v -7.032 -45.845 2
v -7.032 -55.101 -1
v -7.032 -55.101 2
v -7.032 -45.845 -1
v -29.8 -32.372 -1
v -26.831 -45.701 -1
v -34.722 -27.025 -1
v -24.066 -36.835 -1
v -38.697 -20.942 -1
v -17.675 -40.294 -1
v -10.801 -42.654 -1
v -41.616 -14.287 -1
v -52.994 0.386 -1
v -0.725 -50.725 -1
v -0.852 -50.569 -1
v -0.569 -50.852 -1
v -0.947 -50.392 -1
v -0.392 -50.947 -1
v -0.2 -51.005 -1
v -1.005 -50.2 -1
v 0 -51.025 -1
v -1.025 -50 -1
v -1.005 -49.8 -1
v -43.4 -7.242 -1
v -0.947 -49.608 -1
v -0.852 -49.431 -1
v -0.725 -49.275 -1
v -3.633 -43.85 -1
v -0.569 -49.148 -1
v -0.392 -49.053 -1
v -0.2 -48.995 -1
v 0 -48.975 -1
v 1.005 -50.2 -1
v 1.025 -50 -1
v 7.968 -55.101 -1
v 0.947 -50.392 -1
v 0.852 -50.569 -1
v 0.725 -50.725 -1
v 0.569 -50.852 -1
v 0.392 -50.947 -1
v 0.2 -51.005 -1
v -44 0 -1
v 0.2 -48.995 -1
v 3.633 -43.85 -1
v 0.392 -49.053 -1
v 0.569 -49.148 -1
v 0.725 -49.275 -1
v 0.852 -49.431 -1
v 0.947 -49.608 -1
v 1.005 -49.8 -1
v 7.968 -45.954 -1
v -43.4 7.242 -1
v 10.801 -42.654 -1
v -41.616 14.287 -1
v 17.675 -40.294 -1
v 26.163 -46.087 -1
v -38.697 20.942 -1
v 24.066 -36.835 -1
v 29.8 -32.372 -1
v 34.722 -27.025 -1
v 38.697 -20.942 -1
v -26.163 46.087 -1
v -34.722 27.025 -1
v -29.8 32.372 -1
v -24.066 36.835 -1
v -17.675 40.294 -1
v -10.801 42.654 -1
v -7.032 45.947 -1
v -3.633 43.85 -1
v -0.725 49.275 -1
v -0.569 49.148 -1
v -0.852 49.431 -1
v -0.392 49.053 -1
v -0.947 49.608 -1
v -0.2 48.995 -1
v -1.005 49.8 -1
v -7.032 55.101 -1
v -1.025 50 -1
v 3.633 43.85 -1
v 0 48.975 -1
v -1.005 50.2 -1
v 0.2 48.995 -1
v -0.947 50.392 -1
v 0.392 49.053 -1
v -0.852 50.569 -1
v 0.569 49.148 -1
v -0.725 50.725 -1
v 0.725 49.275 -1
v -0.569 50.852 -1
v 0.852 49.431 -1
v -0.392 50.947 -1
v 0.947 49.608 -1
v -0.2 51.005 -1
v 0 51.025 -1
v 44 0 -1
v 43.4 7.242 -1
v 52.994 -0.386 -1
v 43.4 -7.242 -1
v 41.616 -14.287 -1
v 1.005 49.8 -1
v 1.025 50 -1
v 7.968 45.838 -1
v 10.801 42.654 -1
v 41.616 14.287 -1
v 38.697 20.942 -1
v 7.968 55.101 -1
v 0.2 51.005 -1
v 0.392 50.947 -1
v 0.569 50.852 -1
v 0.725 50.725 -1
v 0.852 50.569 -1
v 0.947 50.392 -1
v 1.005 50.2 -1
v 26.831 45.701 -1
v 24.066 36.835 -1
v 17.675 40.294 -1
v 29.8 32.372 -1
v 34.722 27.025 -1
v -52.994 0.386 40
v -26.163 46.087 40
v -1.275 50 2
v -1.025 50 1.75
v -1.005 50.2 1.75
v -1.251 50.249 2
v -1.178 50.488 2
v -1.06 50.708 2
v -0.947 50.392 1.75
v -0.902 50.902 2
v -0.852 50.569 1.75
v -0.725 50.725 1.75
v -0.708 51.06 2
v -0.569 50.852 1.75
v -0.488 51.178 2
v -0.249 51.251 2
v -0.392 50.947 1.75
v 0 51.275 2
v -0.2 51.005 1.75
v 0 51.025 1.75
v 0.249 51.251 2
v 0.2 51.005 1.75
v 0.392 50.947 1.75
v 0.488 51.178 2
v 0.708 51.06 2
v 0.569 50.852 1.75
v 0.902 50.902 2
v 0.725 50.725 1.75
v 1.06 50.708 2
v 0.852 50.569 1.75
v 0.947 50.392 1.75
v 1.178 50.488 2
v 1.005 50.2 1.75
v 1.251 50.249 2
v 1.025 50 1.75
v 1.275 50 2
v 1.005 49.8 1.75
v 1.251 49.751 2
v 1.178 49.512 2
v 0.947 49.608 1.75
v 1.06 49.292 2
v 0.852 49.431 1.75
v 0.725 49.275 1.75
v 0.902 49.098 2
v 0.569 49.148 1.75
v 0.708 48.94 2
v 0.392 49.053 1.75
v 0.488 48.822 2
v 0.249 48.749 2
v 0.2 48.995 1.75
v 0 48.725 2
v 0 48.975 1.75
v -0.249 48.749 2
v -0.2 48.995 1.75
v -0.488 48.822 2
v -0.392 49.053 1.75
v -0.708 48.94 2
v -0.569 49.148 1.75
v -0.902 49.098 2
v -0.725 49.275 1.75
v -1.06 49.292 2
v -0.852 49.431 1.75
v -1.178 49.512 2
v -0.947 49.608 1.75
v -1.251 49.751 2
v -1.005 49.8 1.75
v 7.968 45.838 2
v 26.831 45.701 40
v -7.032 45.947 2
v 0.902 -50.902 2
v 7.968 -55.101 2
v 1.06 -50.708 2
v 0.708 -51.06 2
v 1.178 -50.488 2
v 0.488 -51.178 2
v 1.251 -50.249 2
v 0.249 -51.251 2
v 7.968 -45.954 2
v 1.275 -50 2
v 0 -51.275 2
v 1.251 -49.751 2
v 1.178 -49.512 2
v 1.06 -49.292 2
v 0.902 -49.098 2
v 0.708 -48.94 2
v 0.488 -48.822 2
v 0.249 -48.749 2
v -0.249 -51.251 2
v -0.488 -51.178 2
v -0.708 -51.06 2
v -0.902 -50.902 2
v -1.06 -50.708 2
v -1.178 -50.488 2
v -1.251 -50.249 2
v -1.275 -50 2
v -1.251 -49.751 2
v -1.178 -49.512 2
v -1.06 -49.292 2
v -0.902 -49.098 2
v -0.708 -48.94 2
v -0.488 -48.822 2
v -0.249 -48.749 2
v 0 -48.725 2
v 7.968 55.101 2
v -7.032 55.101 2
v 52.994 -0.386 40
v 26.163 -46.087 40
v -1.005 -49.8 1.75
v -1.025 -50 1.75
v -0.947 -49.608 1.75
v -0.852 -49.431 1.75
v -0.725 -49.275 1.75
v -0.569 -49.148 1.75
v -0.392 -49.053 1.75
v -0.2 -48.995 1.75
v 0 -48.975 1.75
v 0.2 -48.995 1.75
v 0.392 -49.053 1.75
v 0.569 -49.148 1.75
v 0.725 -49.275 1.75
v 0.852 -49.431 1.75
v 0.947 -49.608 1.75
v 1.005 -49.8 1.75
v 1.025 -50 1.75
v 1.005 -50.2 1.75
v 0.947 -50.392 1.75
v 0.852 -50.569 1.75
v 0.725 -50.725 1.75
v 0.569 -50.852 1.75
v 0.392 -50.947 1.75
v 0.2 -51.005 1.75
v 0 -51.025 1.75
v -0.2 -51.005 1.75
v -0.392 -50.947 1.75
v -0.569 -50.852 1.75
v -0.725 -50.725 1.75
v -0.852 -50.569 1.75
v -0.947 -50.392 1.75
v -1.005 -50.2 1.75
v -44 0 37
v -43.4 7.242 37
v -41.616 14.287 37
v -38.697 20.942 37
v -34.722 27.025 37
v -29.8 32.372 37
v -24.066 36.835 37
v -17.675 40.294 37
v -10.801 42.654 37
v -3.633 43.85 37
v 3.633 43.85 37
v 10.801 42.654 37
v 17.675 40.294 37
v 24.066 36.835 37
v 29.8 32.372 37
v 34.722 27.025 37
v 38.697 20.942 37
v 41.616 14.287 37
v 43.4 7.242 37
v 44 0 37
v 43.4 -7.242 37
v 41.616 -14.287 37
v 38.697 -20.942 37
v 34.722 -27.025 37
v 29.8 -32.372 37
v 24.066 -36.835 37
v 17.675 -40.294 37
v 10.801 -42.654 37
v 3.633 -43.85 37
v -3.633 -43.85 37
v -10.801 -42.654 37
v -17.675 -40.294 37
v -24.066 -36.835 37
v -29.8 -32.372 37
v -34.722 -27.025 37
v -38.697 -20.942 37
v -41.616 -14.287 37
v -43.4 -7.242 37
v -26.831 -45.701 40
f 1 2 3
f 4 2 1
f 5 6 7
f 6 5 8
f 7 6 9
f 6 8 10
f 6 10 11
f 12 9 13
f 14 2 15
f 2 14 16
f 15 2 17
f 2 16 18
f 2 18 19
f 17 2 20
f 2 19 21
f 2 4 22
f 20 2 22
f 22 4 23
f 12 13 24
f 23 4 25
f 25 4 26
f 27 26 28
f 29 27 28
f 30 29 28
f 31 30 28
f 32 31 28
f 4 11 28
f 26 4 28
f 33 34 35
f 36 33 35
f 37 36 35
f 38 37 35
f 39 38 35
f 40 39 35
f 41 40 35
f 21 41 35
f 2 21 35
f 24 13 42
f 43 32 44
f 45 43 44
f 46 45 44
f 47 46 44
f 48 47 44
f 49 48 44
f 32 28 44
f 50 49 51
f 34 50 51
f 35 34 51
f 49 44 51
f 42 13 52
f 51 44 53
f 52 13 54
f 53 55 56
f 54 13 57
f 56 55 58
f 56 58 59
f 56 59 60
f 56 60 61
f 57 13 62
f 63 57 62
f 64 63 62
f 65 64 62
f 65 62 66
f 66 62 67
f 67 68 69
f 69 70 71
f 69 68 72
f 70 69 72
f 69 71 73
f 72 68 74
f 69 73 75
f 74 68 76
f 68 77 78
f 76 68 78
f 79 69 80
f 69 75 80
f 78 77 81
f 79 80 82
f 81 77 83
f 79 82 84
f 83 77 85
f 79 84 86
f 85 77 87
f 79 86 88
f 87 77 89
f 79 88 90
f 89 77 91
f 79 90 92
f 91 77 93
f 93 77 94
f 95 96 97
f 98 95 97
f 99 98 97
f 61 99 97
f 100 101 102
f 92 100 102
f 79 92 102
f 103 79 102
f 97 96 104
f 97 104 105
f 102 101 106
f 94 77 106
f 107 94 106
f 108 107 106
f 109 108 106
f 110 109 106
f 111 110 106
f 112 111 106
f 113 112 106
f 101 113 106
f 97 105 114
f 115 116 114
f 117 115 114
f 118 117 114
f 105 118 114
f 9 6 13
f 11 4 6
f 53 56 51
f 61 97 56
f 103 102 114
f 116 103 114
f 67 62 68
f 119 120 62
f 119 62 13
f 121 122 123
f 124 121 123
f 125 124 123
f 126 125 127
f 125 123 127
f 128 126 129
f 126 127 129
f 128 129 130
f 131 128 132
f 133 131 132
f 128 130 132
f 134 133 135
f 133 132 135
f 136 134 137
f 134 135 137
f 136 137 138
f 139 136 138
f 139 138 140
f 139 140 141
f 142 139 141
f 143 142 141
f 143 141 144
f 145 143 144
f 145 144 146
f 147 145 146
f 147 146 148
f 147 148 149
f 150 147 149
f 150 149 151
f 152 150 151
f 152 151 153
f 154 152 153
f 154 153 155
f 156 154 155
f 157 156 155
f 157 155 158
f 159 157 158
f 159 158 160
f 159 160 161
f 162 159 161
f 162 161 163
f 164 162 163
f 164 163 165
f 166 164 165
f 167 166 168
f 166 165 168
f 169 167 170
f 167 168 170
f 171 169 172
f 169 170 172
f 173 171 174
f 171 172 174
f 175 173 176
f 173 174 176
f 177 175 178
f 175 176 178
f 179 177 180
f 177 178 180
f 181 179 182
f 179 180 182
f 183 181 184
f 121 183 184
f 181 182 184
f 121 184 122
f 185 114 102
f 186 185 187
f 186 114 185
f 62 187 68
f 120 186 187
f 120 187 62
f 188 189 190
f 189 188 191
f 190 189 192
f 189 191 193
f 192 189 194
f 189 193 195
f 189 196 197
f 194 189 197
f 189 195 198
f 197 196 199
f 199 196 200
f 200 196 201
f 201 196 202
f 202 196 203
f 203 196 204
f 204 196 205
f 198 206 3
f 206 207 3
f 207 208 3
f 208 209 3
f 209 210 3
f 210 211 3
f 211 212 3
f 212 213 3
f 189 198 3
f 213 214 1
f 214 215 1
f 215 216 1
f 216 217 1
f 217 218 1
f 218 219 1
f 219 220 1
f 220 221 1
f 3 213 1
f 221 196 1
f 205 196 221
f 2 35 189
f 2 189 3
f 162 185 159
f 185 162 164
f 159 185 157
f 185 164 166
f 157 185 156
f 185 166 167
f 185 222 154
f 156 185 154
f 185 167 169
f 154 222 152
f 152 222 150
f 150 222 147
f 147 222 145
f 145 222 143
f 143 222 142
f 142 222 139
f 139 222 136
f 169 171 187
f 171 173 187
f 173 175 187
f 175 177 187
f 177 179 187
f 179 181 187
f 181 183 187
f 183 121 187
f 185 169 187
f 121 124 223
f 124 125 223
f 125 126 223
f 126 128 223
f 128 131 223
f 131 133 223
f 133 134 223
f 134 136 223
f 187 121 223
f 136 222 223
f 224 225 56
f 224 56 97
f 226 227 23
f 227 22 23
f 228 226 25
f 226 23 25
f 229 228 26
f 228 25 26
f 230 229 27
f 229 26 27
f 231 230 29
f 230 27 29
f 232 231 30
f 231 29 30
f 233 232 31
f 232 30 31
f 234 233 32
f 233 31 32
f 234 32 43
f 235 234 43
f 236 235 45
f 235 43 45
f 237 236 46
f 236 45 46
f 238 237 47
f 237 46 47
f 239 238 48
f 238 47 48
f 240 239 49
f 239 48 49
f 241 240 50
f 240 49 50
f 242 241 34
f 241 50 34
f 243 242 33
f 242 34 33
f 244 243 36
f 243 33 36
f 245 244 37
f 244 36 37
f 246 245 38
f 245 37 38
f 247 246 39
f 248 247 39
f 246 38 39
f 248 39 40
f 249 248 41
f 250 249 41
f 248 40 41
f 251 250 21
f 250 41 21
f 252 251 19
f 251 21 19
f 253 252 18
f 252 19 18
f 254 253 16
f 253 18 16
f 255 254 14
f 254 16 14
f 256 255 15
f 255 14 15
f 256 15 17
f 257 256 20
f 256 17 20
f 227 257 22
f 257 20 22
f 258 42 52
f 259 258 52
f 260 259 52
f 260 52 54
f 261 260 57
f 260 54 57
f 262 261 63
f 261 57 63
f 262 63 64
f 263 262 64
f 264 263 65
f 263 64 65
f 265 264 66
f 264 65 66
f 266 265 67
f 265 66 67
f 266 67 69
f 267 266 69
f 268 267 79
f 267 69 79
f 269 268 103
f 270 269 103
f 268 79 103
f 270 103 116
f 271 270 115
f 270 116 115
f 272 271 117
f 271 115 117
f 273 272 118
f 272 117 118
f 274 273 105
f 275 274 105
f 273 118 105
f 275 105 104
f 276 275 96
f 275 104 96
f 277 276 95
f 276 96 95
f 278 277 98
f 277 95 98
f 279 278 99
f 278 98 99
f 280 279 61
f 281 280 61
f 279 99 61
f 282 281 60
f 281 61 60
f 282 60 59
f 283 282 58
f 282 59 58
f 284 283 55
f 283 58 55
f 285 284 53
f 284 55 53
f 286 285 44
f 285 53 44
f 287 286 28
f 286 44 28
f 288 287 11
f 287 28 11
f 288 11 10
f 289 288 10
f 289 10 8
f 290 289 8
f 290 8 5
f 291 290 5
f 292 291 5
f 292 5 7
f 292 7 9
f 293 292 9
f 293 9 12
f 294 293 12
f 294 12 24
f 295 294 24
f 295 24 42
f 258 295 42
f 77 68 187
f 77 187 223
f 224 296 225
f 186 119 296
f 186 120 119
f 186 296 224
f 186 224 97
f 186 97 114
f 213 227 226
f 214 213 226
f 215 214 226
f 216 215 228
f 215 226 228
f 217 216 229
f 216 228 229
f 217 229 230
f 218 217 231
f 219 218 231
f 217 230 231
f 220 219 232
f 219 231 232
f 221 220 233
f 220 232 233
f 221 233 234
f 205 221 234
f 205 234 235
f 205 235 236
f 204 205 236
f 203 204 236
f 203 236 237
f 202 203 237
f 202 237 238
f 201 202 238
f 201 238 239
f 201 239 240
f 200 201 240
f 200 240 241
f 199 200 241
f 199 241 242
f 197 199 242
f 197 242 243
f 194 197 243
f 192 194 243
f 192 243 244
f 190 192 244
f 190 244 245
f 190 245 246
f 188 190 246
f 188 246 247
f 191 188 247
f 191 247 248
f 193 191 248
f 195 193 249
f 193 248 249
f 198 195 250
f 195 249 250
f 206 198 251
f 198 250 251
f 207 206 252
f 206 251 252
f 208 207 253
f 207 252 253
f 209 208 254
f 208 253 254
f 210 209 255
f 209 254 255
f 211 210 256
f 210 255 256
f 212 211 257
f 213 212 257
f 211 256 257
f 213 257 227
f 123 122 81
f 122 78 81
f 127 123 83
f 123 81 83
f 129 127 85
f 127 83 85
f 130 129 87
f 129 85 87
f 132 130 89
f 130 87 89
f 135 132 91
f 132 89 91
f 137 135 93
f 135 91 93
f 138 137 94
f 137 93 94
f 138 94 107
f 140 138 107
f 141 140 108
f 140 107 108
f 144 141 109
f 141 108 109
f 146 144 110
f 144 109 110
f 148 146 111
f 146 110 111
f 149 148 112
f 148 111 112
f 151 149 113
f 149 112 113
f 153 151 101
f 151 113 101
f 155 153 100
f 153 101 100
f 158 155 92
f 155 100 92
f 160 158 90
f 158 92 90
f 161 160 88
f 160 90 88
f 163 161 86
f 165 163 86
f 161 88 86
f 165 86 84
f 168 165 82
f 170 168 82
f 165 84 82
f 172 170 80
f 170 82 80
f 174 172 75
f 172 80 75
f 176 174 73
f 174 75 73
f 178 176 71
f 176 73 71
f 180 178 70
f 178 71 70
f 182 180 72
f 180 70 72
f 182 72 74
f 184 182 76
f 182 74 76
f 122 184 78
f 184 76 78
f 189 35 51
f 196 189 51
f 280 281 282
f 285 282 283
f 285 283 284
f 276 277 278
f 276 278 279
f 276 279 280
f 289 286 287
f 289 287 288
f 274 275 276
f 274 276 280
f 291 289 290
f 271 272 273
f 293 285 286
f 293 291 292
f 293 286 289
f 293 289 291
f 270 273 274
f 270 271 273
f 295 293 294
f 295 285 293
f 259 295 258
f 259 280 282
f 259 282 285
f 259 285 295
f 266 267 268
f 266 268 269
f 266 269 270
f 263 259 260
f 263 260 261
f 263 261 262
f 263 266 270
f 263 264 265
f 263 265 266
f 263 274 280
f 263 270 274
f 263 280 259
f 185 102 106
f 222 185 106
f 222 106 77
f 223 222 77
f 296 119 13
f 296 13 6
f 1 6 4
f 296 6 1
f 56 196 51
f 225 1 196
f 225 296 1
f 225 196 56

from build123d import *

# Parameters (mm, degrees)
BOSS_EXTRUDE4_DEPTH                = 40
BOSS_EXTRUDE4_DEPTH_BACK           = 1
SKETCH10_R                         = 44
CUT_EXTRUDE3_DEPTH                 = 38
SKETCH11_W                         = 15
SKETCH11_H                         = 10
BOSS_EXTRUDE5_DEPTH                = 3
M2_5X0_45_TAPPED_HOLE3_D           = 2.05
M2_5X0_45_TAPPED_HOLE3_CSINK_D     = 2.55
M2_5X0_45_TAPPED_HOLE3_CSINK_ANGLE = 90
BOSS_EXTRUDE6_DEPTH                = 41
SKETCH17_R                         = 44
CUT_EXTRUDE4_DEPTH                 = 38


with BuildPart() as part:
    # Sketch1 → Boss-Extrude4 (new body, two sides)
    with BuildSketch(Plane.XY) as boss_extrude4_sk:
        Polygon((52.078255867, 0), (26.039127933, 45.101092565), (-26.039127933, 45.101092565), (-52.078255867, 0), (-26.039127933, -45.101092565), (26.039127933, -45.101092565), align=None)
    extrude(amount=BOSS_EXTRUDE4_DEPTH)
    extrude(boss_extrude4_sk.sketch, amount=-BOSS_EXTRUDE4_DEPTH_BACK)

    # Sketch10 → Cut-Extrude3 (cut)
    with BuildSketch(Plane(origin=(0, 0, -1), x_dir=(-1, 0, 0), z_dir=(0, 0, -1))):
        Circle(SKETCH10_R)
    extrude(amount=-CUT_EXTRUDE3_DEPTH, mode=Mode.SUBTRACT)

    # Sketch11 → Boss-Extrude5 (add)
    with BuildSketch(Plane(origin=(0, 0, -1), x_dir=(-1, 0, 0), z_dir=(0, 0, -1))):
        with Locations((-0.468011799, 50.101092565)):
            Rectangle(SKETCH11_W, SKETCH11_H)
        with Locations((-0.468011799, -50.101092565)):
            Rectangle(SKETCH11_W, SKETCH11_H)
    extrude(amount=-BOSS_EXTRUDE5_DEPTH)

    # M2.5x0.45 Tapped Hole3 (through all)
    with Locations(Plane.XY.offset(2)):
        with Locations((0, 50), (0, -50)):
            CounterSinkHole(M2_5X0_45_TAPPED_HOLE3_D / 2, M2_5X0_45_TAPPED_HOLE3_CSINK_D / 2, counter_sink_angle=M2_5X0_45_TAPPED_HOLE3_CSINK_ANGLE)

    # Sketch16 → Boss-Extrude6 (add)
    with BuildSketch(Plane.XY.offset(40)):
        Polygon((-52.993622647, 0.385678178), (-26.830818423, -45.700984362), (26.162804224, -46.08666254), (52.993622647, -0.385678178), (26.830818423, 45.700984362), (-26.162804224, 46.08666254), align=None)
    extrude(amount=-BOSS_EXTRUDE6_DEPTH)

    # Sketch17 → Cut-Extrude4 (cut)
    with BuildSketch(Plane(origin=(0, 0, -1), x_dir=(-1, 0, 0), z_dir=(0, 0, -1))):
        Circle(SKETCH17_R)
    extrude(amount=-CUT_EXTRUDE4_DEPTH, mode=Mode.SUBTRACT)


solid = part.part
